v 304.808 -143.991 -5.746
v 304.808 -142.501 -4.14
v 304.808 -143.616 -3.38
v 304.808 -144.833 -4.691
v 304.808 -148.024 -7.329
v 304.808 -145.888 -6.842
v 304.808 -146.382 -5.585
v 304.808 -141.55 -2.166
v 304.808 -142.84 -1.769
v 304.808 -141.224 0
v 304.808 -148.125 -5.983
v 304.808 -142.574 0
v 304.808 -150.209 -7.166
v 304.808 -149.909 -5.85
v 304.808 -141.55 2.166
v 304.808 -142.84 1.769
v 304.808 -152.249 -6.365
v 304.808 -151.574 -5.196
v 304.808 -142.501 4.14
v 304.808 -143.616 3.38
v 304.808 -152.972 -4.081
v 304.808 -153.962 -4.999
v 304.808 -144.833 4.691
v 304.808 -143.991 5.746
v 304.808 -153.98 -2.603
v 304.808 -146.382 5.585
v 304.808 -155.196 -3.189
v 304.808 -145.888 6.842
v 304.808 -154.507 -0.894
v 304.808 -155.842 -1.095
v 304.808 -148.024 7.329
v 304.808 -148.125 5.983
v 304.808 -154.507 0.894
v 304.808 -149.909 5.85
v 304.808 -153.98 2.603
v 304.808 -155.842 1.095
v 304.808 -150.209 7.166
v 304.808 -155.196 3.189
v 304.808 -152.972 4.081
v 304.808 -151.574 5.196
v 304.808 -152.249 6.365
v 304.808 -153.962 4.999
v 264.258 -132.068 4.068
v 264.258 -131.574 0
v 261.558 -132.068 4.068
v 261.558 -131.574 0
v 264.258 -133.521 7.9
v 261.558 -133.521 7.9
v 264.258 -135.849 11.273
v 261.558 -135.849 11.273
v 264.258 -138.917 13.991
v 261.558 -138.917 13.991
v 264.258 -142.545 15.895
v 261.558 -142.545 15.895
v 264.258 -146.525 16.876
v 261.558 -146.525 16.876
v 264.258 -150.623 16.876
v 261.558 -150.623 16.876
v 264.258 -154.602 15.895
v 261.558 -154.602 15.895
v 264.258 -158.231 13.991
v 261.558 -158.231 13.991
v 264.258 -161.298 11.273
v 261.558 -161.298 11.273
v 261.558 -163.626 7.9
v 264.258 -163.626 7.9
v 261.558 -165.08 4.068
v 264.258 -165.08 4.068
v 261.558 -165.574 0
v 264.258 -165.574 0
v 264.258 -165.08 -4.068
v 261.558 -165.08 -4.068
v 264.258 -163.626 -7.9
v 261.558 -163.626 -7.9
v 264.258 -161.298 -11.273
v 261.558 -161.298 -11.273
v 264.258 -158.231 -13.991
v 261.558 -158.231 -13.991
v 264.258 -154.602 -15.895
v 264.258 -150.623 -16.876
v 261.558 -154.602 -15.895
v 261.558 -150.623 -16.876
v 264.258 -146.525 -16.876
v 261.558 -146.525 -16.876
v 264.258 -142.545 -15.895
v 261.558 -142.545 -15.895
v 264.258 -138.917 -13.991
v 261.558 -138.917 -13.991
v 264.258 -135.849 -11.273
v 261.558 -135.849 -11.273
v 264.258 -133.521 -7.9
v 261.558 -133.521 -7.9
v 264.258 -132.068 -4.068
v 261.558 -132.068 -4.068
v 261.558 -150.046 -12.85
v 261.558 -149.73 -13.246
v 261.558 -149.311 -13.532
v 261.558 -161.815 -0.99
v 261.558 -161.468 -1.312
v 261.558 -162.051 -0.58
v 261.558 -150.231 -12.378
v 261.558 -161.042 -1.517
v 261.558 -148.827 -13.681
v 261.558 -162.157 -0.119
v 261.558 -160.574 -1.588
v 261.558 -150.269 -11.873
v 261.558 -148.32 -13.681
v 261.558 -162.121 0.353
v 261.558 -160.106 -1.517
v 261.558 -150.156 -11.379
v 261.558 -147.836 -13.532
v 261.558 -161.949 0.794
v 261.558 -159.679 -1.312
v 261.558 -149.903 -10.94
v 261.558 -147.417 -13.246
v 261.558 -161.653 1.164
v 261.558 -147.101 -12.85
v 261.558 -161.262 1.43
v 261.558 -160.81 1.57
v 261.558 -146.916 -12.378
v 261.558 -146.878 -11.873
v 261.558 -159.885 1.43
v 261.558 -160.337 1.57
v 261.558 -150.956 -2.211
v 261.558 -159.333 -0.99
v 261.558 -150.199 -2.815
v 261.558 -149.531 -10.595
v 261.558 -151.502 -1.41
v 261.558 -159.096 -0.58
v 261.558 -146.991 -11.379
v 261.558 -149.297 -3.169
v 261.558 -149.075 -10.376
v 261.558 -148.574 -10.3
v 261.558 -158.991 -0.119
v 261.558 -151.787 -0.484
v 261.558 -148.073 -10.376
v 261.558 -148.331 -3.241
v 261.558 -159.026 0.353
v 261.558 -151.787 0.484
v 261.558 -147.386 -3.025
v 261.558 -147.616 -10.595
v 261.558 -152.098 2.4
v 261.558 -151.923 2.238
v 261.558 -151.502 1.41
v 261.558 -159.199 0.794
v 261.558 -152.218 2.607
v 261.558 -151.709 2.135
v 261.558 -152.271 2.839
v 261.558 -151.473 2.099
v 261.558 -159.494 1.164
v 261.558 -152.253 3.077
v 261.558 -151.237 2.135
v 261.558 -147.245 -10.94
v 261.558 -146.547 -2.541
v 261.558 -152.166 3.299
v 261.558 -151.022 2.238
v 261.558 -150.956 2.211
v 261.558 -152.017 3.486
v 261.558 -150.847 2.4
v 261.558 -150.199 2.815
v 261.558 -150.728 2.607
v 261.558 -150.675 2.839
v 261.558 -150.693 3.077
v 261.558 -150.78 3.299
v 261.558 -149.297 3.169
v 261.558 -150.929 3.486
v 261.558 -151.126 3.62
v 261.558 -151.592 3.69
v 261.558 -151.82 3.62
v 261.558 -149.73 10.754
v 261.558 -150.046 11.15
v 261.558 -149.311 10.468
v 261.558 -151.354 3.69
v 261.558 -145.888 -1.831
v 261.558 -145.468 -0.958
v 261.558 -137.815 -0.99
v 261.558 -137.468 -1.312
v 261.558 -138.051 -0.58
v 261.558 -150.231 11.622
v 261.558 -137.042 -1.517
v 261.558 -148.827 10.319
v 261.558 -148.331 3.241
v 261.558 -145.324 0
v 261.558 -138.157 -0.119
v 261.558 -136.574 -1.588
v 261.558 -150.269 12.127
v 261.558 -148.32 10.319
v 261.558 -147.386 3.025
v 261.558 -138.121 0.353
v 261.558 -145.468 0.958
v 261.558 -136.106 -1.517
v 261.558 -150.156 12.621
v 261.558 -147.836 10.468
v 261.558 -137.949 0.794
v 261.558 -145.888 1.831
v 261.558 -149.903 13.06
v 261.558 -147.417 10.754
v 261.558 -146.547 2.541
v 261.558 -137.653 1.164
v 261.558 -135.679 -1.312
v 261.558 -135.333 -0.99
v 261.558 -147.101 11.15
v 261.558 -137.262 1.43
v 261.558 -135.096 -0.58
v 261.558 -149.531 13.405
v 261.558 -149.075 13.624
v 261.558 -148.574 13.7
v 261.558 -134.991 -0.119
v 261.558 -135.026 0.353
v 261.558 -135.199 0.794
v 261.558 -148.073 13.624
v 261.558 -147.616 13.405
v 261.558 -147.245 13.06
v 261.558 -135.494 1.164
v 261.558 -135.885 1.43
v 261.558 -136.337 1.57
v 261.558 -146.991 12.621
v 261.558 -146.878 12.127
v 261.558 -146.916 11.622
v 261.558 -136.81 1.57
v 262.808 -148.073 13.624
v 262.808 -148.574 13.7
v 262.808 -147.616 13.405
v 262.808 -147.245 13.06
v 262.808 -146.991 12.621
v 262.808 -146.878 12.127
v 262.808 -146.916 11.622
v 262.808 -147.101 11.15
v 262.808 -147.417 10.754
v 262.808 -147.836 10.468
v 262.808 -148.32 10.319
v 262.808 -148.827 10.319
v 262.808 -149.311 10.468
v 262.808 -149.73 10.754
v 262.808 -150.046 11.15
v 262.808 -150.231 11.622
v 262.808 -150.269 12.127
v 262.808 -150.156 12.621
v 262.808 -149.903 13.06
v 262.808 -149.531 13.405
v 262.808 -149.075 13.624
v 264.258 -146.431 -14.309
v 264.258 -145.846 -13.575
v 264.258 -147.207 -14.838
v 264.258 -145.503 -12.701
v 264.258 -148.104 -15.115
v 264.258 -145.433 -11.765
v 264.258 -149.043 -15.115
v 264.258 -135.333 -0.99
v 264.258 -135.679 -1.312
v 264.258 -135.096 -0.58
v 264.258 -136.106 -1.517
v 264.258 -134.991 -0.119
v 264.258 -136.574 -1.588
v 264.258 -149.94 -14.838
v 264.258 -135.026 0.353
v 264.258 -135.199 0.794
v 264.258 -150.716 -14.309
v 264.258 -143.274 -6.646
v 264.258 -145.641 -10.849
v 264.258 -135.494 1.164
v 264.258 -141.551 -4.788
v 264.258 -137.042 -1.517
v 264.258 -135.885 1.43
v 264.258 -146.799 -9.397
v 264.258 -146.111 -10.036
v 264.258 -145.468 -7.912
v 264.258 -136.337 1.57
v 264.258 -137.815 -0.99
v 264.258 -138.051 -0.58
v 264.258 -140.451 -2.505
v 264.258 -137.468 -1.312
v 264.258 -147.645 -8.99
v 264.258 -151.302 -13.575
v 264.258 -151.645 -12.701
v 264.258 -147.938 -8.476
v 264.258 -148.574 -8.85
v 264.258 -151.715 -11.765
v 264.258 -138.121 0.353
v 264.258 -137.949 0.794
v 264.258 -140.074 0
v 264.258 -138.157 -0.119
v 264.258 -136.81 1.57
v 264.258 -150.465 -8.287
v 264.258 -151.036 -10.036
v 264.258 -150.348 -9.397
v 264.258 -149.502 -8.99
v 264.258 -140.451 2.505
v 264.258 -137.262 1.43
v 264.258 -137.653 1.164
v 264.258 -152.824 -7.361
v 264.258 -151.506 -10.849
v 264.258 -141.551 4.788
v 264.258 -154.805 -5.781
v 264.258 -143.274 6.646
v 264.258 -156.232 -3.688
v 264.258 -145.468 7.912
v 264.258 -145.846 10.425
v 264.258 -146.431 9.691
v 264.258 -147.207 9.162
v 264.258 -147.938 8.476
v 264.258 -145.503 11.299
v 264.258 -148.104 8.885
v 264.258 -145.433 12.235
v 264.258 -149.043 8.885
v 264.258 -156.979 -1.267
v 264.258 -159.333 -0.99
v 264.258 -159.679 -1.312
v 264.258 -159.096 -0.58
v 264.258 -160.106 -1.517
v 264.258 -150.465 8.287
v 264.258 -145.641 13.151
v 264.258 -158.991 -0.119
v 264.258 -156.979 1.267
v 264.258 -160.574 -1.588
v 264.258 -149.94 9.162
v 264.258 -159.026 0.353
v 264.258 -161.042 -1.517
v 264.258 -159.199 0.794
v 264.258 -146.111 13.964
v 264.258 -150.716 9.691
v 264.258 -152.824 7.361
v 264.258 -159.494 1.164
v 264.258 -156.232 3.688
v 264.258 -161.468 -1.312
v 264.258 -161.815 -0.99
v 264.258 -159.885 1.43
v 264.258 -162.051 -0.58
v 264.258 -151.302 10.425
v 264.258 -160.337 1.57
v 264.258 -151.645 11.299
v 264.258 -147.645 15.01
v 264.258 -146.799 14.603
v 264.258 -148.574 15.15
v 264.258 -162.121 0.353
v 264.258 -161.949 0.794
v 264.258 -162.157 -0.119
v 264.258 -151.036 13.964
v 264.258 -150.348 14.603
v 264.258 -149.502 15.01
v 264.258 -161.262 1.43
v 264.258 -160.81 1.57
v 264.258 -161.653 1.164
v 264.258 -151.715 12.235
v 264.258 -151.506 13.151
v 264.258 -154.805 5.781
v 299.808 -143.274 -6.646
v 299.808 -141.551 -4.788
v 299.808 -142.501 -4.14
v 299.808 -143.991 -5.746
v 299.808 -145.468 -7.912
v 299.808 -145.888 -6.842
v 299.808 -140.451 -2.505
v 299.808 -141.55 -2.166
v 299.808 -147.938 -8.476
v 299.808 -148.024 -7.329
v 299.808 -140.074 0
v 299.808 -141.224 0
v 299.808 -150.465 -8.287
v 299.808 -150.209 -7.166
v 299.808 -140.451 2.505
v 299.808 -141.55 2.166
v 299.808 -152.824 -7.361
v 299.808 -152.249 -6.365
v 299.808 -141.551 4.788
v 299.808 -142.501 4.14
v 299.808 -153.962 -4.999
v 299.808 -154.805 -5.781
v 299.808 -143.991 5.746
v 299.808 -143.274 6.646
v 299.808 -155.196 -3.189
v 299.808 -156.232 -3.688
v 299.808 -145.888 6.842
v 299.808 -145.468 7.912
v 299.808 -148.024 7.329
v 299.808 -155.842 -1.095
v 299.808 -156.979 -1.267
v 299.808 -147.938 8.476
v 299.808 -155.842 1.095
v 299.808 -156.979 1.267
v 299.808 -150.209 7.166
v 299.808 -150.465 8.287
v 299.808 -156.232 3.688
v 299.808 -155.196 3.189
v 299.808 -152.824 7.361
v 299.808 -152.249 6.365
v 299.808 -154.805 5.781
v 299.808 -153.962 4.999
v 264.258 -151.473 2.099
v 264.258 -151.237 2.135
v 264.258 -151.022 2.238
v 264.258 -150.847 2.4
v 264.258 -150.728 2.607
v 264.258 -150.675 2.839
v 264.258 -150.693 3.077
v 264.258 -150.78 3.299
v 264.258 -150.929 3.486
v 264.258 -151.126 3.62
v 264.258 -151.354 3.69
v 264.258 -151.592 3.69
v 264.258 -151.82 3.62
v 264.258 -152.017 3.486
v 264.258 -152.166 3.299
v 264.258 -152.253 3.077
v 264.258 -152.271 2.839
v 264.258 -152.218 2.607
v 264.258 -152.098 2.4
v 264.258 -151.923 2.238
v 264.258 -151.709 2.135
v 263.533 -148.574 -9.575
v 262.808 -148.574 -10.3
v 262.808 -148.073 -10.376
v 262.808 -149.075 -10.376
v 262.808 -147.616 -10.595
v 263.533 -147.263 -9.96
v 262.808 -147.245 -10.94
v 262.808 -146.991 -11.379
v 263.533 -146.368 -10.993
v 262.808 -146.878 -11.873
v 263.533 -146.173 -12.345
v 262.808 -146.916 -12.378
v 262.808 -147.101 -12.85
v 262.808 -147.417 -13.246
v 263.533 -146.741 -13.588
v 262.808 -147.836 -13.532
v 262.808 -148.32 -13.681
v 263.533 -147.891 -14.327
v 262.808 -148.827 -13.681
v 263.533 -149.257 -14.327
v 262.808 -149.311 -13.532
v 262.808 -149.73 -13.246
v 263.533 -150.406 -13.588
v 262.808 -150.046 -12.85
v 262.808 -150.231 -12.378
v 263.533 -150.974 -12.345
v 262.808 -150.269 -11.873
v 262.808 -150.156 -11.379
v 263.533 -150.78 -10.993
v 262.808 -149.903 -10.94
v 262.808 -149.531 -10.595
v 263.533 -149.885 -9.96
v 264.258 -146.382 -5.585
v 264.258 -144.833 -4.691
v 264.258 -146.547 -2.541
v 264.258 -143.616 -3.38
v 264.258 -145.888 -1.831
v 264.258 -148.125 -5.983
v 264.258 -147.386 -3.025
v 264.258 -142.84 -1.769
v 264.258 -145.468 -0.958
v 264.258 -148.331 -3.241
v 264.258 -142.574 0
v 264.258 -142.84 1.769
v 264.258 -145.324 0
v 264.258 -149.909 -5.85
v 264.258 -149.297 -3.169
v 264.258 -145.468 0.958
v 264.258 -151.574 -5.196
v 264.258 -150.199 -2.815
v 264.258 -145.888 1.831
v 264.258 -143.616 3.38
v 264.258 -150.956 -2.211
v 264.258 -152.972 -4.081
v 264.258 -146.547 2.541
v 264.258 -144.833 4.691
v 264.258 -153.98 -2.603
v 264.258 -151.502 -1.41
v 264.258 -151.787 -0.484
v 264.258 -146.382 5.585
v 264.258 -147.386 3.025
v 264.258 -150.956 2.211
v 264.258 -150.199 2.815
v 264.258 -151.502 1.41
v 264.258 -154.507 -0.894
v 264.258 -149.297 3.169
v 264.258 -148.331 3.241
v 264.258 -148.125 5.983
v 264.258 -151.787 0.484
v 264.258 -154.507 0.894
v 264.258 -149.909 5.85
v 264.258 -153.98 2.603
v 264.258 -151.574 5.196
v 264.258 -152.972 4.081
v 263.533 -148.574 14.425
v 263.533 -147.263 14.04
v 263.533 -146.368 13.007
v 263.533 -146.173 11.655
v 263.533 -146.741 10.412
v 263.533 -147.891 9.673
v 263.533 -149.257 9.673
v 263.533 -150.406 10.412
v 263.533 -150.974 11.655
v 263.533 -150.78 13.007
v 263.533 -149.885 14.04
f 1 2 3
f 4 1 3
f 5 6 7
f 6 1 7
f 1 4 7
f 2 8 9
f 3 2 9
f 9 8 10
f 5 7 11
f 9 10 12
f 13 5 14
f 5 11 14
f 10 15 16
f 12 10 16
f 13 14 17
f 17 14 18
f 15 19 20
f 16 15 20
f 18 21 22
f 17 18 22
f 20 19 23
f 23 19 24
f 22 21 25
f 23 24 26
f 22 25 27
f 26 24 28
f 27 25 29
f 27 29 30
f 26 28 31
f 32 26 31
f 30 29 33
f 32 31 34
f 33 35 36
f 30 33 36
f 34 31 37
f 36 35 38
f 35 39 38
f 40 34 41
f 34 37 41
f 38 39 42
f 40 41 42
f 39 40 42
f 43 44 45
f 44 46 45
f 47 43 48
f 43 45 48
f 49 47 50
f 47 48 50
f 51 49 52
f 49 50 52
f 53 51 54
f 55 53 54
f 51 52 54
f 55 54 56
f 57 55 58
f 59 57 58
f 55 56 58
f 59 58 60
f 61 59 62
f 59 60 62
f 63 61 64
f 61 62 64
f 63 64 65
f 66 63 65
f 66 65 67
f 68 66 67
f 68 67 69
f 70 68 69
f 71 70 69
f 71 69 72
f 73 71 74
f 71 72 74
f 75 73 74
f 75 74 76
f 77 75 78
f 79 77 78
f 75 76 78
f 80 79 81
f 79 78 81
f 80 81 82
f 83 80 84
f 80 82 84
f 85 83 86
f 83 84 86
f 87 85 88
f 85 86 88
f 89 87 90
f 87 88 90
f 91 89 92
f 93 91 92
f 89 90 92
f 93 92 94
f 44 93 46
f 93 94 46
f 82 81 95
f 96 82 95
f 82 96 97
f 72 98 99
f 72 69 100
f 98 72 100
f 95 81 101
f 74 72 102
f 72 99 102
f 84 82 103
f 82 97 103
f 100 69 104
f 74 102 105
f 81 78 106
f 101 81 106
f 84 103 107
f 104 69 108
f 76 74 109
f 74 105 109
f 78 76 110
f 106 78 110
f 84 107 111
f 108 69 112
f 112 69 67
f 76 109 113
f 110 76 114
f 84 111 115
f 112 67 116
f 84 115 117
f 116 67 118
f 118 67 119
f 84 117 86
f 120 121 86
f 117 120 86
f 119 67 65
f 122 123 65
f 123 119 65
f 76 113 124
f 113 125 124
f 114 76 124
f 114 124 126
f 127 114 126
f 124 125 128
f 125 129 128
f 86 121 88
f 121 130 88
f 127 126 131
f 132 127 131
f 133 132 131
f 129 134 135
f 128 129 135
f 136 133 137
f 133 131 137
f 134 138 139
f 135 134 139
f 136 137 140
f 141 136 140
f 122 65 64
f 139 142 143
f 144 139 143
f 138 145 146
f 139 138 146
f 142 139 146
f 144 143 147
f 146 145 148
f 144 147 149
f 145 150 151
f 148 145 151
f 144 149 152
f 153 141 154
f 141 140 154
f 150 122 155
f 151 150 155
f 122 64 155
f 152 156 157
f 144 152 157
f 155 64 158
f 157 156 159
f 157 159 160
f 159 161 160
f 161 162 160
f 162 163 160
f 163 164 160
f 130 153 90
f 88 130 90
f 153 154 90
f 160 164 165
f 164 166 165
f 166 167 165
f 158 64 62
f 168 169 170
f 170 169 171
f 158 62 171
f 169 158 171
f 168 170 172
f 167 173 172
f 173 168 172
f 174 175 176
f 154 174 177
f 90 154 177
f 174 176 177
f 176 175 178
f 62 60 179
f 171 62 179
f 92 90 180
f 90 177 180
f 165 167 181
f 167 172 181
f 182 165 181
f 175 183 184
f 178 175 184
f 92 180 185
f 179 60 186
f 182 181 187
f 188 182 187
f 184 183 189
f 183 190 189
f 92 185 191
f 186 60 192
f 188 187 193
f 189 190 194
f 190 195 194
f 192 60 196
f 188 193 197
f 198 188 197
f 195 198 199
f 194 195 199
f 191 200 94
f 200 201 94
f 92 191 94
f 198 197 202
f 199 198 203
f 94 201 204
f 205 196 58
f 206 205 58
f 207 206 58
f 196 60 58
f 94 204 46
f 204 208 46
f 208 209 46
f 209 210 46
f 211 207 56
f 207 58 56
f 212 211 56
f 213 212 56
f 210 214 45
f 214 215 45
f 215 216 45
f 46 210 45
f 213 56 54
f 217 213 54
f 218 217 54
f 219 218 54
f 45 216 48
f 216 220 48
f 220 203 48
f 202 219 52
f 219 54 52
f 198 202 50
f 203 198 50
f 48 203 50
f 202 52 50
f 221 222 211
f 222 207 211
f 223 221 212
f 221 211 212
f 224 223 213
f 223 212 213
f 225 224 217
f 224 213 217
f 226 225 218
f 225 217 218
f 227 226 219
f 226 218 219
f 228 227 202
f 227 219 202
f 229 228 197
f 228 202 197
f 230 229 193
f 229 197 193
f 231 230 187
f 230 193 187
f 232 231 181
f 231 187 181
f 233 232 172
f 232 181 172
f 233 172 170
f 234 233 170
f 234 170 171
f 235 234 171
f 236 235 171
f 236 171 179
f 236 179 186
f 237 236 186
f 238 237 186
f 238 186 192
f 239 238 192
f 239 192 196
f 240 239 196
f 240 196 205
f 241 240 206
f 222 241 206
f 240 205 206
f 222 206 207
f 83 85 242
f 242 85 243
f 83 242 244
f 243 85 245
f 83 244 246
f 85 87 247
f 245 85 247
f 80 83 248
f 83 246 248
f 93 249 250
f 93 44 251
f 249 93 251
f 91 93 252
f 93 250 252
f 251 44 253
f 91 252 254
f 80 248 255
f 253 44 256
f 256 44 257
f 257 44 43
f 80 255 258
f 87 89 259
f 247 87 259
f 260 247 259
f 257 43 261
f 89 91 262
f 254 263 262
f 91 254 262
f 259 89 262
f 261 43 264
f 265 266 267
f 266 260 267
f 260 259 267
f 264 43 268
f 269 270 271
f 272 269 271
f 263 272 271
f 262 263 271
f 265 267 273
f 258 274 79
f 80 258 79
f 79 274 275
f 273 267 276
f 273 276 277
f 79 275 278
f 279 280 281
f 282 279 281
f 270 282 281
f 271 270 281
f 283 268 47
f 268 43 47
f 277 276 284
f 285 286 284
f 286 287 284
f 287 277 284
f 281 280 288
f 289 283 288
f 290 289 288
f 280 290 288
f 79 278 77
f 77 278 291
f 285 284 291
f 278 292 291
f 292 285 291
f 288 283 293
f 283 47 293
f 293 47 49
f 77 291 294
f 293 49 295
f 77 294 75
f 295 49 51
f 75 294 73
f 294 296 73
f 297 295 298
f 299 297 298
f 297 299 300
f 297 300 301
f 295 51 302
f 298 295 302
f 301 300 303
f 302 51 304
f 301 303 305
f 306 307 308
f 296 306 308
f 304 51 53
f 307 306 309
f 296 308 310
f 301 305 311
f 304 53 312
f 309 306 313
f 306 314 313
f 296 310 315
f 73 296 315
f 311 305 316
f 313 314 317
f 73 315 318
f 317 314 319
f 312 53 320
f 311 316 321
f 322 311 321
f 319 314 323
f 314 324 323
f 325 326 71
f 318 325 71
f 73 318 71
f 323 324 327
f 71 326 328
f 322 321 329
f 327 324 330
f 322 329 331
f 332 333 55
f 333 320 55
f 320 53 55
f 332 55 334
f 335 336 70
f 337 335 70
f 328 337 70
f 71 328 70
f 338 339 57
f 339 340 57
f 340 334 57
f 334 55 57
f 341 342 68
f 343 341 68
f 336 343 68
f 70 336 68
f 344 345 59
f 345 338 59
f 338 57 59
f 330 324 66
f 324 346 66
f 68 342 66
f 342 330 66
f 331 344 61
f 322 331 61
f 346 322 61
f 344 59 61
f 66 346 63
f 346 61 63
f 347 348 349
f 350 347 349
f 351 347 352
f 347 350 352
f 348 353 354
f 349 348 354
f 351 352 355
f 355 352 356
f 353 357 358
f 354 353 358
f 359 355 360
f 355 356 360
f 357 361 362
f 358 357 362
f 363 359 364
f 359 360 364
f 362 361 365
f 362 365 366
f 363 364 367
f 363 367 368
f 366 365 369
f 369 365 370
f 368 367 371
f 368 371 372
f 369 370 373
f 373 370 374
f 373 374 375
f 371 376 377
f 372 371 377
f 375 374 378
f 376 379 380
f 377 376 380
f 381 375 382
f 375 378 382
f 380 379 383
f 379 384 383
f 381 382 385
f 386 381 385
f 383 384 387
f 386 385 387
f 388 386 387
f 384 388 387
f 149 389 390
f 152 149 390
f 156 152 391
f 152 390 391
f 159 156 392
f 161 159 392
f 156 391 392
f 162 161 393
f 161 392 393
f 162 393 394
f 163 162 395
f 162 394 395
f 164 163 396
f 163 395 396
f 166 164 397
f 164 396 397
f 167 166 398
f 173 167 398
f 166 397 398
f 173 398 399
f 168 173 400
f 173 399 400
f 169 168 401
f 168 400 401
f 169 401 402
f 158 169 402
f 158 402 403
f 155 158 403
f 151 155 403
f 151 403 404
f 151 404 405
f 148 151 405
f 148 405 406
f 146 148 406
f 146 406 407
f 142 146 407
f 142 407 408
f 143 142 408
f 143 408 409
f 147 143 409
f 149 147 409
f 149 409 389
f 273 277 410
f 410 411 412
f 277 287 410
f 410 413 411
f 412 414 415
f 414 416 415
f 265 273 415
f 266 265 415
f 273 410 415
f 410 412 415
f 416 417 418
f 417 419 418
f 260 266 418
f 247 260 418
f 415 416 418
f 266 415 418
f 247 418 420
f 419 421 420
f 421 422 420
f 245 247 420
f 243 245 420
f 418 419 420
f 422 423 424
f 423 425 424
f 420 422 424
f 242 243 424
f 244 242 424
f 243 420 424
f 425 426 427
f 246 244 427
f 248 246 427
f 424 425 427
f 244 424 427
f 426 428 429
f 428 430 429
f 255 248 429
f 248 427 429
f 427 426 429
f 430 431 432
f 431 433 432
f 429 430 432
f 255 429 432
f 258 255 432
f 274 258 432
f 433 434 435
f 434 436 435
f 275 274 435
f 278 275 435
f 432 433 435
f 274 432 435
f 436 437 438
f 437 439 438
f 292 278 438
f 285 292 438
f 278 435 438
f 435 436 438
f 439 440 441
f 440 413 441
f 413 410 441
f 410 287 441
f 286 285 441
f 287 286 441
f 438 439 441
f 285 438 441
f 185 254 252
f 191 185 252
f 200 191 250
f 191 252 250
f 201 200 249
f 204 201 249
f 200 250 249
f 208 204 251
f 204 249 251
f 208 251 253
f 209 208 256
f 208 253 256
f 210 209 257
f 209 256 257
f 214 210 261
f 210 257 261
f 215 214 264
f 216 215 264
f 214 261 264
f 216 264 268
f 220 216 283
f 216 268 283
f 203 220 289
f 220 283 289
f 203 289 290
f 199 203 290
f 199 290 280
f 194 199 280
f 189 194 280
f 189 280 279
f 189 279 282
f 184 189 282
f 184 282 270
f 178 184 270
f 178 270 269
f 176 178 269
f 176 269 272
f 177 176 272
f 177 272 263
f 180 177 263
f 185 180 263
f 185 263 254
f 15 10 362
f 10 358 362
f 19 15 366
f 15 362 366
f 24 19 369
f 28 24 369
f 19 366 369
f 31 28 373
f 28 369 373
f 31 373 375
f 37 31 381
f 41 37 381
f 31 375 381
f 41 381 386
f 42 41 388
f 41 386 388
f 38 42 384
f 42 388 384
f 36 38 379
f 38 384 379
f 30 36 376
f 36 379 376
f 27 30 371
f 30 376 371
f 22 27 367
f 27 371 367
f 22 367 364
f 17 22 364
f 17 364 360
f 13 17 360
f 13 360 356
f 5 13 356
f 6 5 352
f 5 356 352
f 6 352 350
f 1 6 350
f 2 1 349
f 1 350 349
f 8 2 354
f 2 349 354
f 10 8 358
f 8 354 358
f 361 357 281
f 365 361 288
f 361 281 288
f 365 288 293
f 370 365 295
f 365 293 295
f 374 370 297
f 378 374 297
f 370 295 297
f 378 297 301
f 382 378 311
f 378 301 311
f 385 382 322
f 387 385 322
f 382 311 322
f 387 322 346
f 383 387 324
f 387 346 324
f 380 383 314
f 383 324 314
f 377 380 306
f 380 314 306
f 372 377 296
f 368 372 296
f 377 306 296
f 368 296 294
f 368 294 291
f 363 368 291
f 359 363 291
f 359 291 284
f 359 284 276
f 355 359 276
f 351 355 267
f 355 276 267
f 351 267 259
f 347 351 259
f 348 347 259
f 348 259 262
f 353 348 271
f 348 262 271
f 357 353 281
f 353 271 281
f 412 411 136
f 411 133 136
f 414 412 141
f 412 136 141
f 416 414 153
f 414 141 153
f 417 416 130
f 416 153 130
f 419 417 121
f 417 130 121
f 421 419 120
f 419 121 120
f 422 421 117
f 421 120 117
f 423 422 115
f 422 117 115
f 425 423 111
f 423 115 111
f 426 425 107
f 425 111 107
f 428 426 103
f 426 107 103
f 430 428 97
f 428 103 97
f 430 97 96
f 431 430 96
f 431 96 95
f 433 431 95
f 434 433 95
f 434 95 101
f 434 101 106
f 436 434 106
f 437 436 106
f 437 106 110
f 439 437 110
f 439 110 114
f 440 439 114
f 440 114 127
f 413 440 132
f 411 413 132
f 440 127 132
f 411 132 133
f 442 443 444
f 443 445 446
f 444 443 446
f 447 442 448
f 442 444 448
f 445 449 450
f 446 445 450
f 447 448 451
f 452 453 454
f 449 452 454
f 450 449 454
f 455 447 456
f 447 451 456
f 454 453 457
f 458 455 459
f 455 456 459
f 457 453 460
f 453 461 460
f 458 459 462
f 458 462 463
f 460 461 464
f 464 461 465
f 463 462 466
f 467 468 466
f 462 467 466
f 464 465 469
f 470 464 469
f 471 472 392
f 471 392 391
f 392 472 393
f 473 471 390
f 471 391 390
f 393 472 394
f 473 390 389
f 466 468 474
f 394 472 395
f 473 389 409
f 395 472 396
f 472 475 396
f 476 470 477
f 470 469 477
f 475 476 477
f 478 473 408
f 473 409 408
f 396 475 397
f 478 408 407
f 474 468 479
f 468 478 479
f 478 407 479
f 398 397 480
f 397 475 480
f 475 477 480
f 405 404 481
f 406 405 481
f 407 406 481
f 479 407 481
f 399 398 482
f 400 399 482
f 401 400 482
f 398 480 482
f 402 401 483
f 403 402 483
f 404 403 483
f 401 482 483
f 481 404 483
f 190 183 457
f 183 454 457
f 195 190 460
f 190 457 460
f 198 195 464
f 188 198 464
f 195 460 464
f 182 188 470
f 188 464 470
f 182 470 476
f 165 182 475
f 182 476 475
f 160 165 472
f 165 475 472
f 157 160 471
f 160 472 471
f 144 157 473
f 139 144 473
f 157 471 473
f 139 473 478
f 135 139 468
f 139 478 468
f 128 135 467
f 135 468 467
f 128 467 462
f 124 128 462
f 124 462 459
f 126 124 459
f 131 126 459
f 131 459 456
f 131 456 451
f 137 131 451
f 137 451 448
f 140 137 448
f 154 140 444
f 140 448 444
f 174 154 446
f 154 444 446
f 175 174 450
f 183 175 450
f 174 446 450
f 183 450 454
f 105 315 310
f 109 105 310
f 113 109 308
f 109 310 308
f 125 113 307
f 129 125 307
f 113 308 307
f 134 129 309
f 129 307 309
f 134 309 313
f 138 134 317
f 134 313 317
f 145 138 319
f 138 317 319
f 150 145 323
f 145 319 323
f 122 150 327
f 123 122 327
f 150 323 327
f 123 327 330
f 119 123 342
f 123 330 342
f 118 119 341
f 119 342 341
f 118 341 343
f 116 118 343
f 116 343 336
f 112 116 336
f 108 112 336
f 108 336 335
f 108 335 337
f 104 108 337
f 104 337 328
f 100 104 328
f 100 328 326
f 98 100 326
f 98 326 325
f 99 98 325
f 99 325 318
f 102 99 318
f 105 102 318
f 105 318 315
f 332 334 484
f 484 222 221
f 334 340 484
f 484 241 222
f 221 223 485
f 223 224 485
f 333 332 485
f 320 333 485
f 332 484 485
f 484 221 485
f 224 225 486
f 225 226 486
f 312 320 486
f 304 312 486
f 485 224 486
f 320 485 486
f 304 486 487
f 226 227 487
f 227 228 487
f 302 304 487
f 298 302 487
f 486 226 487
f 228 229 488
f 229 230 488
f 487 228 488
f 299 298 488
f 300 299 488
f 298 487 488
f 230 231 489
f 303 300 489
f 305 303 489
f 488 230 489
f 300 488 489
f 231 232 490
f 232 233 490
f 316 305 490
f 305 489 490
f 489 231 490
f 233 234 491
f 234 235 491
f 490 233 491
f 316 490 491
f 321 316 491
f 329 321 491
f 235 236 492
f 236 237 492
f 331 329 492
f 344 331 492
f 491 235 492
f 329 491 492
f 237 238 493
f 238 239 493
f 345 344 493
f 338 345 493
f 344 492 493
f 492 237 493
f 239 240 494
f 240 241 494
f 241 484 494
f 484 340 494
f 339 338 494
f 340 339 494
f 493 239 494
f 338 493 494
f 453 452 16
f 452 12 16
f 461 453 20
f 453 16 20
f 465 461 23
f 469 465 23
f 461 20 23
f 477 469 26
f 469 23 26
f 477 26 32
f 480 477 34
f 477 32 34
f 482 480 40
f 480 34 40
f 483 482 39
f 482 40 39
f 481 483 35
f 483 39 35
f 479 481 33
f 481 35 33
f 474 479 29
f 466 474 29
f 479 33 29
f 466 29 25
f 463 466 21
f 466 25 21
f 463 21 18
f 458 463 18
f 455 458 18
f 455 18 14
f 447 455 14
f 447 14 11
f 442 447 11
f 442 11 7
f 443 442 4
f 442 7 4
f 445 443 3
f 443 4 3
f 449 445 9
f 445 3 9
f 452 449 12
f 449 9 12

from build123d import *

# Parameters (mm, degrees)
CUT_EXTRUDE1_REACH                                  = 4.7
SKETCH4_R                                           = 1.5875
CSK_FOR_M3_COUNTERSUNK_FLAT_HEAD_SCREW1_D           = 3.4
CSK_FOR_M3_COUNTERSUNK_FLAT_HEAD_SCREW1_DEPTH       = 10
CSK_FOR_M3_COUNTERSUNK_FLAT_HEAD_SCREW1_CSINK_D     = 6.3
CSK_FOR_M3_COUNTERSUNK_FLAT_HEAD_SCREW1_CSINK_ANGLE = 90
CSK_FOR_M3_COUNTERSUNK_FLAT_HEAD_SCREW1_TIP         = 1.021463052
SKETCH14_R                                          = 0.8
CUT_EXTRUDE3_DEPTH                                  = 10


with BuildPart() as part:
    # Sketch3 → Revolve19 (revolve)
    with BuildSketch(Plane.XY):
        Polygon((299.808388758, -140.073704322), (264.258388758, -140.073704322), (264.258388758, -131.573704322), (261.558388758, -131.573704322), (261.558388758, -143.823704322), (261.558388758, -145.323704322), (262.558388758, -145.323704322), (264.258388758, -145.323704322), (264.258388758, -142.573704322), (304.808388758, -142.573704322), (304.808388758, -141.223704322), (299.808388758, -141.223704322), align=None)
    revolve(axis=Axis((227.370475166, -148.573704322, 0), (1, 0, 0)))

    # Sketch4 → Cut-Extrude1 (cut, up to next)
    with BuildSketch(Plane(origin=(264.258388758, 0, 0), x_dir=(0, 0, -1), z_dir=(1, 0, 0)), mode=Mode.PRIVATE) as cut_extrude1_sk1:
        with Locations((0, -136.573704322)):
            Circle(SKETCH4_R)
    cut_extrude1_tool1 = extrude(cut_extrude1_sk1.sketch, amount=-CUT_EXTRUDE1_REACH, mode=Mode.PRIVATE) & part.part
    add(cut_extrude1_tool1.solids().sort_by_distance((264.258389, -136.573704, 0))[0], mode=Mode.SUBTRACT)
    # Sketch4 → Cut-Extrude1 (cut, up to next)
    with BuildSketch(Plane(origin=(264.258388758, 0, 0), x_dir=(0, 0, -1), z_dir=(1, 0, 0)), mode=Mode.PRIVATE) as cut_extrude1_sk2:
        with Locations((0, -160.573704322)):
            Circle(SKETCH4_R)
    cut_extrude1_tool2 = extrude(cut_extrude1_sk2.sketch, amount=-CUT_EXTRUDE1_REACH, mode=Mode.PRIVATE) & part.part
    add(cut_extrude1_tool2.solids().sort_by_distance((264.258389, -160.573704, 0))[0], mode=Mode.SUBTRACT)

    # CSK for M3 Countersunk Flat Head Screw1
    with Locations(Plane(origin=(264.258388758, 0, 0), x_dir=(0, 0, -1), z_dir=(1, 0, 0))):
        with Locations((-12, -148.573704322), (12, -148.573704322)):
            CounterSinkHole(CSK_FOR_M3_COUNTERSUNK_FLAT_HEAD_SCREW1_D / 2, CSK_FOR_M3_COUNTERSUNK_FLAT_HEAD_SCREW1_CSINK_D / 2, depth=CSK_FOR_M3_COUNTERSUNK_FLAT_HEAD_SCREW1_DEPTH, counter_sink_angle=CSK_FOR_M3_COUNTERSUNK_FLAT_HEAD_SCREW1_CSINK_ANGLE)
            with Locations((0, 0, -(CSK_FOR_M3_COUNTERSUNK_FLAT_HEAD_SCREW1_DEPTH + CSK_FOR_M3_COUNTERSUNK_FLAT_HEAD_SCREW1_TIP / 2))):  # 118° drill point
                Cone(0, CSK_FOR_M3_COUNTERSUNK_FLAT_HEAD_SCREW1_D / 2, CSK_FOR_M3_COUNTERSUNK_FLAT_HEAD_SCREW1_TIP, mode=Mode.SUBTRACT)

    # Sketch14 → Cut-Extrude3 (cut)
    with BuildSketch(Plane(origin=(264.258388758, 0, 0), x_dir=(0, 0, -1), z_dir=(1, 0, 0))):
        with Locations((-2.899137803, -151.472842125)):
            Circle(SKETCH14_R)
    extrude(amount=-CUT_EXTRUDE3_DEPTH, mode=Mode.SUBTRACT)


solid = part.part
